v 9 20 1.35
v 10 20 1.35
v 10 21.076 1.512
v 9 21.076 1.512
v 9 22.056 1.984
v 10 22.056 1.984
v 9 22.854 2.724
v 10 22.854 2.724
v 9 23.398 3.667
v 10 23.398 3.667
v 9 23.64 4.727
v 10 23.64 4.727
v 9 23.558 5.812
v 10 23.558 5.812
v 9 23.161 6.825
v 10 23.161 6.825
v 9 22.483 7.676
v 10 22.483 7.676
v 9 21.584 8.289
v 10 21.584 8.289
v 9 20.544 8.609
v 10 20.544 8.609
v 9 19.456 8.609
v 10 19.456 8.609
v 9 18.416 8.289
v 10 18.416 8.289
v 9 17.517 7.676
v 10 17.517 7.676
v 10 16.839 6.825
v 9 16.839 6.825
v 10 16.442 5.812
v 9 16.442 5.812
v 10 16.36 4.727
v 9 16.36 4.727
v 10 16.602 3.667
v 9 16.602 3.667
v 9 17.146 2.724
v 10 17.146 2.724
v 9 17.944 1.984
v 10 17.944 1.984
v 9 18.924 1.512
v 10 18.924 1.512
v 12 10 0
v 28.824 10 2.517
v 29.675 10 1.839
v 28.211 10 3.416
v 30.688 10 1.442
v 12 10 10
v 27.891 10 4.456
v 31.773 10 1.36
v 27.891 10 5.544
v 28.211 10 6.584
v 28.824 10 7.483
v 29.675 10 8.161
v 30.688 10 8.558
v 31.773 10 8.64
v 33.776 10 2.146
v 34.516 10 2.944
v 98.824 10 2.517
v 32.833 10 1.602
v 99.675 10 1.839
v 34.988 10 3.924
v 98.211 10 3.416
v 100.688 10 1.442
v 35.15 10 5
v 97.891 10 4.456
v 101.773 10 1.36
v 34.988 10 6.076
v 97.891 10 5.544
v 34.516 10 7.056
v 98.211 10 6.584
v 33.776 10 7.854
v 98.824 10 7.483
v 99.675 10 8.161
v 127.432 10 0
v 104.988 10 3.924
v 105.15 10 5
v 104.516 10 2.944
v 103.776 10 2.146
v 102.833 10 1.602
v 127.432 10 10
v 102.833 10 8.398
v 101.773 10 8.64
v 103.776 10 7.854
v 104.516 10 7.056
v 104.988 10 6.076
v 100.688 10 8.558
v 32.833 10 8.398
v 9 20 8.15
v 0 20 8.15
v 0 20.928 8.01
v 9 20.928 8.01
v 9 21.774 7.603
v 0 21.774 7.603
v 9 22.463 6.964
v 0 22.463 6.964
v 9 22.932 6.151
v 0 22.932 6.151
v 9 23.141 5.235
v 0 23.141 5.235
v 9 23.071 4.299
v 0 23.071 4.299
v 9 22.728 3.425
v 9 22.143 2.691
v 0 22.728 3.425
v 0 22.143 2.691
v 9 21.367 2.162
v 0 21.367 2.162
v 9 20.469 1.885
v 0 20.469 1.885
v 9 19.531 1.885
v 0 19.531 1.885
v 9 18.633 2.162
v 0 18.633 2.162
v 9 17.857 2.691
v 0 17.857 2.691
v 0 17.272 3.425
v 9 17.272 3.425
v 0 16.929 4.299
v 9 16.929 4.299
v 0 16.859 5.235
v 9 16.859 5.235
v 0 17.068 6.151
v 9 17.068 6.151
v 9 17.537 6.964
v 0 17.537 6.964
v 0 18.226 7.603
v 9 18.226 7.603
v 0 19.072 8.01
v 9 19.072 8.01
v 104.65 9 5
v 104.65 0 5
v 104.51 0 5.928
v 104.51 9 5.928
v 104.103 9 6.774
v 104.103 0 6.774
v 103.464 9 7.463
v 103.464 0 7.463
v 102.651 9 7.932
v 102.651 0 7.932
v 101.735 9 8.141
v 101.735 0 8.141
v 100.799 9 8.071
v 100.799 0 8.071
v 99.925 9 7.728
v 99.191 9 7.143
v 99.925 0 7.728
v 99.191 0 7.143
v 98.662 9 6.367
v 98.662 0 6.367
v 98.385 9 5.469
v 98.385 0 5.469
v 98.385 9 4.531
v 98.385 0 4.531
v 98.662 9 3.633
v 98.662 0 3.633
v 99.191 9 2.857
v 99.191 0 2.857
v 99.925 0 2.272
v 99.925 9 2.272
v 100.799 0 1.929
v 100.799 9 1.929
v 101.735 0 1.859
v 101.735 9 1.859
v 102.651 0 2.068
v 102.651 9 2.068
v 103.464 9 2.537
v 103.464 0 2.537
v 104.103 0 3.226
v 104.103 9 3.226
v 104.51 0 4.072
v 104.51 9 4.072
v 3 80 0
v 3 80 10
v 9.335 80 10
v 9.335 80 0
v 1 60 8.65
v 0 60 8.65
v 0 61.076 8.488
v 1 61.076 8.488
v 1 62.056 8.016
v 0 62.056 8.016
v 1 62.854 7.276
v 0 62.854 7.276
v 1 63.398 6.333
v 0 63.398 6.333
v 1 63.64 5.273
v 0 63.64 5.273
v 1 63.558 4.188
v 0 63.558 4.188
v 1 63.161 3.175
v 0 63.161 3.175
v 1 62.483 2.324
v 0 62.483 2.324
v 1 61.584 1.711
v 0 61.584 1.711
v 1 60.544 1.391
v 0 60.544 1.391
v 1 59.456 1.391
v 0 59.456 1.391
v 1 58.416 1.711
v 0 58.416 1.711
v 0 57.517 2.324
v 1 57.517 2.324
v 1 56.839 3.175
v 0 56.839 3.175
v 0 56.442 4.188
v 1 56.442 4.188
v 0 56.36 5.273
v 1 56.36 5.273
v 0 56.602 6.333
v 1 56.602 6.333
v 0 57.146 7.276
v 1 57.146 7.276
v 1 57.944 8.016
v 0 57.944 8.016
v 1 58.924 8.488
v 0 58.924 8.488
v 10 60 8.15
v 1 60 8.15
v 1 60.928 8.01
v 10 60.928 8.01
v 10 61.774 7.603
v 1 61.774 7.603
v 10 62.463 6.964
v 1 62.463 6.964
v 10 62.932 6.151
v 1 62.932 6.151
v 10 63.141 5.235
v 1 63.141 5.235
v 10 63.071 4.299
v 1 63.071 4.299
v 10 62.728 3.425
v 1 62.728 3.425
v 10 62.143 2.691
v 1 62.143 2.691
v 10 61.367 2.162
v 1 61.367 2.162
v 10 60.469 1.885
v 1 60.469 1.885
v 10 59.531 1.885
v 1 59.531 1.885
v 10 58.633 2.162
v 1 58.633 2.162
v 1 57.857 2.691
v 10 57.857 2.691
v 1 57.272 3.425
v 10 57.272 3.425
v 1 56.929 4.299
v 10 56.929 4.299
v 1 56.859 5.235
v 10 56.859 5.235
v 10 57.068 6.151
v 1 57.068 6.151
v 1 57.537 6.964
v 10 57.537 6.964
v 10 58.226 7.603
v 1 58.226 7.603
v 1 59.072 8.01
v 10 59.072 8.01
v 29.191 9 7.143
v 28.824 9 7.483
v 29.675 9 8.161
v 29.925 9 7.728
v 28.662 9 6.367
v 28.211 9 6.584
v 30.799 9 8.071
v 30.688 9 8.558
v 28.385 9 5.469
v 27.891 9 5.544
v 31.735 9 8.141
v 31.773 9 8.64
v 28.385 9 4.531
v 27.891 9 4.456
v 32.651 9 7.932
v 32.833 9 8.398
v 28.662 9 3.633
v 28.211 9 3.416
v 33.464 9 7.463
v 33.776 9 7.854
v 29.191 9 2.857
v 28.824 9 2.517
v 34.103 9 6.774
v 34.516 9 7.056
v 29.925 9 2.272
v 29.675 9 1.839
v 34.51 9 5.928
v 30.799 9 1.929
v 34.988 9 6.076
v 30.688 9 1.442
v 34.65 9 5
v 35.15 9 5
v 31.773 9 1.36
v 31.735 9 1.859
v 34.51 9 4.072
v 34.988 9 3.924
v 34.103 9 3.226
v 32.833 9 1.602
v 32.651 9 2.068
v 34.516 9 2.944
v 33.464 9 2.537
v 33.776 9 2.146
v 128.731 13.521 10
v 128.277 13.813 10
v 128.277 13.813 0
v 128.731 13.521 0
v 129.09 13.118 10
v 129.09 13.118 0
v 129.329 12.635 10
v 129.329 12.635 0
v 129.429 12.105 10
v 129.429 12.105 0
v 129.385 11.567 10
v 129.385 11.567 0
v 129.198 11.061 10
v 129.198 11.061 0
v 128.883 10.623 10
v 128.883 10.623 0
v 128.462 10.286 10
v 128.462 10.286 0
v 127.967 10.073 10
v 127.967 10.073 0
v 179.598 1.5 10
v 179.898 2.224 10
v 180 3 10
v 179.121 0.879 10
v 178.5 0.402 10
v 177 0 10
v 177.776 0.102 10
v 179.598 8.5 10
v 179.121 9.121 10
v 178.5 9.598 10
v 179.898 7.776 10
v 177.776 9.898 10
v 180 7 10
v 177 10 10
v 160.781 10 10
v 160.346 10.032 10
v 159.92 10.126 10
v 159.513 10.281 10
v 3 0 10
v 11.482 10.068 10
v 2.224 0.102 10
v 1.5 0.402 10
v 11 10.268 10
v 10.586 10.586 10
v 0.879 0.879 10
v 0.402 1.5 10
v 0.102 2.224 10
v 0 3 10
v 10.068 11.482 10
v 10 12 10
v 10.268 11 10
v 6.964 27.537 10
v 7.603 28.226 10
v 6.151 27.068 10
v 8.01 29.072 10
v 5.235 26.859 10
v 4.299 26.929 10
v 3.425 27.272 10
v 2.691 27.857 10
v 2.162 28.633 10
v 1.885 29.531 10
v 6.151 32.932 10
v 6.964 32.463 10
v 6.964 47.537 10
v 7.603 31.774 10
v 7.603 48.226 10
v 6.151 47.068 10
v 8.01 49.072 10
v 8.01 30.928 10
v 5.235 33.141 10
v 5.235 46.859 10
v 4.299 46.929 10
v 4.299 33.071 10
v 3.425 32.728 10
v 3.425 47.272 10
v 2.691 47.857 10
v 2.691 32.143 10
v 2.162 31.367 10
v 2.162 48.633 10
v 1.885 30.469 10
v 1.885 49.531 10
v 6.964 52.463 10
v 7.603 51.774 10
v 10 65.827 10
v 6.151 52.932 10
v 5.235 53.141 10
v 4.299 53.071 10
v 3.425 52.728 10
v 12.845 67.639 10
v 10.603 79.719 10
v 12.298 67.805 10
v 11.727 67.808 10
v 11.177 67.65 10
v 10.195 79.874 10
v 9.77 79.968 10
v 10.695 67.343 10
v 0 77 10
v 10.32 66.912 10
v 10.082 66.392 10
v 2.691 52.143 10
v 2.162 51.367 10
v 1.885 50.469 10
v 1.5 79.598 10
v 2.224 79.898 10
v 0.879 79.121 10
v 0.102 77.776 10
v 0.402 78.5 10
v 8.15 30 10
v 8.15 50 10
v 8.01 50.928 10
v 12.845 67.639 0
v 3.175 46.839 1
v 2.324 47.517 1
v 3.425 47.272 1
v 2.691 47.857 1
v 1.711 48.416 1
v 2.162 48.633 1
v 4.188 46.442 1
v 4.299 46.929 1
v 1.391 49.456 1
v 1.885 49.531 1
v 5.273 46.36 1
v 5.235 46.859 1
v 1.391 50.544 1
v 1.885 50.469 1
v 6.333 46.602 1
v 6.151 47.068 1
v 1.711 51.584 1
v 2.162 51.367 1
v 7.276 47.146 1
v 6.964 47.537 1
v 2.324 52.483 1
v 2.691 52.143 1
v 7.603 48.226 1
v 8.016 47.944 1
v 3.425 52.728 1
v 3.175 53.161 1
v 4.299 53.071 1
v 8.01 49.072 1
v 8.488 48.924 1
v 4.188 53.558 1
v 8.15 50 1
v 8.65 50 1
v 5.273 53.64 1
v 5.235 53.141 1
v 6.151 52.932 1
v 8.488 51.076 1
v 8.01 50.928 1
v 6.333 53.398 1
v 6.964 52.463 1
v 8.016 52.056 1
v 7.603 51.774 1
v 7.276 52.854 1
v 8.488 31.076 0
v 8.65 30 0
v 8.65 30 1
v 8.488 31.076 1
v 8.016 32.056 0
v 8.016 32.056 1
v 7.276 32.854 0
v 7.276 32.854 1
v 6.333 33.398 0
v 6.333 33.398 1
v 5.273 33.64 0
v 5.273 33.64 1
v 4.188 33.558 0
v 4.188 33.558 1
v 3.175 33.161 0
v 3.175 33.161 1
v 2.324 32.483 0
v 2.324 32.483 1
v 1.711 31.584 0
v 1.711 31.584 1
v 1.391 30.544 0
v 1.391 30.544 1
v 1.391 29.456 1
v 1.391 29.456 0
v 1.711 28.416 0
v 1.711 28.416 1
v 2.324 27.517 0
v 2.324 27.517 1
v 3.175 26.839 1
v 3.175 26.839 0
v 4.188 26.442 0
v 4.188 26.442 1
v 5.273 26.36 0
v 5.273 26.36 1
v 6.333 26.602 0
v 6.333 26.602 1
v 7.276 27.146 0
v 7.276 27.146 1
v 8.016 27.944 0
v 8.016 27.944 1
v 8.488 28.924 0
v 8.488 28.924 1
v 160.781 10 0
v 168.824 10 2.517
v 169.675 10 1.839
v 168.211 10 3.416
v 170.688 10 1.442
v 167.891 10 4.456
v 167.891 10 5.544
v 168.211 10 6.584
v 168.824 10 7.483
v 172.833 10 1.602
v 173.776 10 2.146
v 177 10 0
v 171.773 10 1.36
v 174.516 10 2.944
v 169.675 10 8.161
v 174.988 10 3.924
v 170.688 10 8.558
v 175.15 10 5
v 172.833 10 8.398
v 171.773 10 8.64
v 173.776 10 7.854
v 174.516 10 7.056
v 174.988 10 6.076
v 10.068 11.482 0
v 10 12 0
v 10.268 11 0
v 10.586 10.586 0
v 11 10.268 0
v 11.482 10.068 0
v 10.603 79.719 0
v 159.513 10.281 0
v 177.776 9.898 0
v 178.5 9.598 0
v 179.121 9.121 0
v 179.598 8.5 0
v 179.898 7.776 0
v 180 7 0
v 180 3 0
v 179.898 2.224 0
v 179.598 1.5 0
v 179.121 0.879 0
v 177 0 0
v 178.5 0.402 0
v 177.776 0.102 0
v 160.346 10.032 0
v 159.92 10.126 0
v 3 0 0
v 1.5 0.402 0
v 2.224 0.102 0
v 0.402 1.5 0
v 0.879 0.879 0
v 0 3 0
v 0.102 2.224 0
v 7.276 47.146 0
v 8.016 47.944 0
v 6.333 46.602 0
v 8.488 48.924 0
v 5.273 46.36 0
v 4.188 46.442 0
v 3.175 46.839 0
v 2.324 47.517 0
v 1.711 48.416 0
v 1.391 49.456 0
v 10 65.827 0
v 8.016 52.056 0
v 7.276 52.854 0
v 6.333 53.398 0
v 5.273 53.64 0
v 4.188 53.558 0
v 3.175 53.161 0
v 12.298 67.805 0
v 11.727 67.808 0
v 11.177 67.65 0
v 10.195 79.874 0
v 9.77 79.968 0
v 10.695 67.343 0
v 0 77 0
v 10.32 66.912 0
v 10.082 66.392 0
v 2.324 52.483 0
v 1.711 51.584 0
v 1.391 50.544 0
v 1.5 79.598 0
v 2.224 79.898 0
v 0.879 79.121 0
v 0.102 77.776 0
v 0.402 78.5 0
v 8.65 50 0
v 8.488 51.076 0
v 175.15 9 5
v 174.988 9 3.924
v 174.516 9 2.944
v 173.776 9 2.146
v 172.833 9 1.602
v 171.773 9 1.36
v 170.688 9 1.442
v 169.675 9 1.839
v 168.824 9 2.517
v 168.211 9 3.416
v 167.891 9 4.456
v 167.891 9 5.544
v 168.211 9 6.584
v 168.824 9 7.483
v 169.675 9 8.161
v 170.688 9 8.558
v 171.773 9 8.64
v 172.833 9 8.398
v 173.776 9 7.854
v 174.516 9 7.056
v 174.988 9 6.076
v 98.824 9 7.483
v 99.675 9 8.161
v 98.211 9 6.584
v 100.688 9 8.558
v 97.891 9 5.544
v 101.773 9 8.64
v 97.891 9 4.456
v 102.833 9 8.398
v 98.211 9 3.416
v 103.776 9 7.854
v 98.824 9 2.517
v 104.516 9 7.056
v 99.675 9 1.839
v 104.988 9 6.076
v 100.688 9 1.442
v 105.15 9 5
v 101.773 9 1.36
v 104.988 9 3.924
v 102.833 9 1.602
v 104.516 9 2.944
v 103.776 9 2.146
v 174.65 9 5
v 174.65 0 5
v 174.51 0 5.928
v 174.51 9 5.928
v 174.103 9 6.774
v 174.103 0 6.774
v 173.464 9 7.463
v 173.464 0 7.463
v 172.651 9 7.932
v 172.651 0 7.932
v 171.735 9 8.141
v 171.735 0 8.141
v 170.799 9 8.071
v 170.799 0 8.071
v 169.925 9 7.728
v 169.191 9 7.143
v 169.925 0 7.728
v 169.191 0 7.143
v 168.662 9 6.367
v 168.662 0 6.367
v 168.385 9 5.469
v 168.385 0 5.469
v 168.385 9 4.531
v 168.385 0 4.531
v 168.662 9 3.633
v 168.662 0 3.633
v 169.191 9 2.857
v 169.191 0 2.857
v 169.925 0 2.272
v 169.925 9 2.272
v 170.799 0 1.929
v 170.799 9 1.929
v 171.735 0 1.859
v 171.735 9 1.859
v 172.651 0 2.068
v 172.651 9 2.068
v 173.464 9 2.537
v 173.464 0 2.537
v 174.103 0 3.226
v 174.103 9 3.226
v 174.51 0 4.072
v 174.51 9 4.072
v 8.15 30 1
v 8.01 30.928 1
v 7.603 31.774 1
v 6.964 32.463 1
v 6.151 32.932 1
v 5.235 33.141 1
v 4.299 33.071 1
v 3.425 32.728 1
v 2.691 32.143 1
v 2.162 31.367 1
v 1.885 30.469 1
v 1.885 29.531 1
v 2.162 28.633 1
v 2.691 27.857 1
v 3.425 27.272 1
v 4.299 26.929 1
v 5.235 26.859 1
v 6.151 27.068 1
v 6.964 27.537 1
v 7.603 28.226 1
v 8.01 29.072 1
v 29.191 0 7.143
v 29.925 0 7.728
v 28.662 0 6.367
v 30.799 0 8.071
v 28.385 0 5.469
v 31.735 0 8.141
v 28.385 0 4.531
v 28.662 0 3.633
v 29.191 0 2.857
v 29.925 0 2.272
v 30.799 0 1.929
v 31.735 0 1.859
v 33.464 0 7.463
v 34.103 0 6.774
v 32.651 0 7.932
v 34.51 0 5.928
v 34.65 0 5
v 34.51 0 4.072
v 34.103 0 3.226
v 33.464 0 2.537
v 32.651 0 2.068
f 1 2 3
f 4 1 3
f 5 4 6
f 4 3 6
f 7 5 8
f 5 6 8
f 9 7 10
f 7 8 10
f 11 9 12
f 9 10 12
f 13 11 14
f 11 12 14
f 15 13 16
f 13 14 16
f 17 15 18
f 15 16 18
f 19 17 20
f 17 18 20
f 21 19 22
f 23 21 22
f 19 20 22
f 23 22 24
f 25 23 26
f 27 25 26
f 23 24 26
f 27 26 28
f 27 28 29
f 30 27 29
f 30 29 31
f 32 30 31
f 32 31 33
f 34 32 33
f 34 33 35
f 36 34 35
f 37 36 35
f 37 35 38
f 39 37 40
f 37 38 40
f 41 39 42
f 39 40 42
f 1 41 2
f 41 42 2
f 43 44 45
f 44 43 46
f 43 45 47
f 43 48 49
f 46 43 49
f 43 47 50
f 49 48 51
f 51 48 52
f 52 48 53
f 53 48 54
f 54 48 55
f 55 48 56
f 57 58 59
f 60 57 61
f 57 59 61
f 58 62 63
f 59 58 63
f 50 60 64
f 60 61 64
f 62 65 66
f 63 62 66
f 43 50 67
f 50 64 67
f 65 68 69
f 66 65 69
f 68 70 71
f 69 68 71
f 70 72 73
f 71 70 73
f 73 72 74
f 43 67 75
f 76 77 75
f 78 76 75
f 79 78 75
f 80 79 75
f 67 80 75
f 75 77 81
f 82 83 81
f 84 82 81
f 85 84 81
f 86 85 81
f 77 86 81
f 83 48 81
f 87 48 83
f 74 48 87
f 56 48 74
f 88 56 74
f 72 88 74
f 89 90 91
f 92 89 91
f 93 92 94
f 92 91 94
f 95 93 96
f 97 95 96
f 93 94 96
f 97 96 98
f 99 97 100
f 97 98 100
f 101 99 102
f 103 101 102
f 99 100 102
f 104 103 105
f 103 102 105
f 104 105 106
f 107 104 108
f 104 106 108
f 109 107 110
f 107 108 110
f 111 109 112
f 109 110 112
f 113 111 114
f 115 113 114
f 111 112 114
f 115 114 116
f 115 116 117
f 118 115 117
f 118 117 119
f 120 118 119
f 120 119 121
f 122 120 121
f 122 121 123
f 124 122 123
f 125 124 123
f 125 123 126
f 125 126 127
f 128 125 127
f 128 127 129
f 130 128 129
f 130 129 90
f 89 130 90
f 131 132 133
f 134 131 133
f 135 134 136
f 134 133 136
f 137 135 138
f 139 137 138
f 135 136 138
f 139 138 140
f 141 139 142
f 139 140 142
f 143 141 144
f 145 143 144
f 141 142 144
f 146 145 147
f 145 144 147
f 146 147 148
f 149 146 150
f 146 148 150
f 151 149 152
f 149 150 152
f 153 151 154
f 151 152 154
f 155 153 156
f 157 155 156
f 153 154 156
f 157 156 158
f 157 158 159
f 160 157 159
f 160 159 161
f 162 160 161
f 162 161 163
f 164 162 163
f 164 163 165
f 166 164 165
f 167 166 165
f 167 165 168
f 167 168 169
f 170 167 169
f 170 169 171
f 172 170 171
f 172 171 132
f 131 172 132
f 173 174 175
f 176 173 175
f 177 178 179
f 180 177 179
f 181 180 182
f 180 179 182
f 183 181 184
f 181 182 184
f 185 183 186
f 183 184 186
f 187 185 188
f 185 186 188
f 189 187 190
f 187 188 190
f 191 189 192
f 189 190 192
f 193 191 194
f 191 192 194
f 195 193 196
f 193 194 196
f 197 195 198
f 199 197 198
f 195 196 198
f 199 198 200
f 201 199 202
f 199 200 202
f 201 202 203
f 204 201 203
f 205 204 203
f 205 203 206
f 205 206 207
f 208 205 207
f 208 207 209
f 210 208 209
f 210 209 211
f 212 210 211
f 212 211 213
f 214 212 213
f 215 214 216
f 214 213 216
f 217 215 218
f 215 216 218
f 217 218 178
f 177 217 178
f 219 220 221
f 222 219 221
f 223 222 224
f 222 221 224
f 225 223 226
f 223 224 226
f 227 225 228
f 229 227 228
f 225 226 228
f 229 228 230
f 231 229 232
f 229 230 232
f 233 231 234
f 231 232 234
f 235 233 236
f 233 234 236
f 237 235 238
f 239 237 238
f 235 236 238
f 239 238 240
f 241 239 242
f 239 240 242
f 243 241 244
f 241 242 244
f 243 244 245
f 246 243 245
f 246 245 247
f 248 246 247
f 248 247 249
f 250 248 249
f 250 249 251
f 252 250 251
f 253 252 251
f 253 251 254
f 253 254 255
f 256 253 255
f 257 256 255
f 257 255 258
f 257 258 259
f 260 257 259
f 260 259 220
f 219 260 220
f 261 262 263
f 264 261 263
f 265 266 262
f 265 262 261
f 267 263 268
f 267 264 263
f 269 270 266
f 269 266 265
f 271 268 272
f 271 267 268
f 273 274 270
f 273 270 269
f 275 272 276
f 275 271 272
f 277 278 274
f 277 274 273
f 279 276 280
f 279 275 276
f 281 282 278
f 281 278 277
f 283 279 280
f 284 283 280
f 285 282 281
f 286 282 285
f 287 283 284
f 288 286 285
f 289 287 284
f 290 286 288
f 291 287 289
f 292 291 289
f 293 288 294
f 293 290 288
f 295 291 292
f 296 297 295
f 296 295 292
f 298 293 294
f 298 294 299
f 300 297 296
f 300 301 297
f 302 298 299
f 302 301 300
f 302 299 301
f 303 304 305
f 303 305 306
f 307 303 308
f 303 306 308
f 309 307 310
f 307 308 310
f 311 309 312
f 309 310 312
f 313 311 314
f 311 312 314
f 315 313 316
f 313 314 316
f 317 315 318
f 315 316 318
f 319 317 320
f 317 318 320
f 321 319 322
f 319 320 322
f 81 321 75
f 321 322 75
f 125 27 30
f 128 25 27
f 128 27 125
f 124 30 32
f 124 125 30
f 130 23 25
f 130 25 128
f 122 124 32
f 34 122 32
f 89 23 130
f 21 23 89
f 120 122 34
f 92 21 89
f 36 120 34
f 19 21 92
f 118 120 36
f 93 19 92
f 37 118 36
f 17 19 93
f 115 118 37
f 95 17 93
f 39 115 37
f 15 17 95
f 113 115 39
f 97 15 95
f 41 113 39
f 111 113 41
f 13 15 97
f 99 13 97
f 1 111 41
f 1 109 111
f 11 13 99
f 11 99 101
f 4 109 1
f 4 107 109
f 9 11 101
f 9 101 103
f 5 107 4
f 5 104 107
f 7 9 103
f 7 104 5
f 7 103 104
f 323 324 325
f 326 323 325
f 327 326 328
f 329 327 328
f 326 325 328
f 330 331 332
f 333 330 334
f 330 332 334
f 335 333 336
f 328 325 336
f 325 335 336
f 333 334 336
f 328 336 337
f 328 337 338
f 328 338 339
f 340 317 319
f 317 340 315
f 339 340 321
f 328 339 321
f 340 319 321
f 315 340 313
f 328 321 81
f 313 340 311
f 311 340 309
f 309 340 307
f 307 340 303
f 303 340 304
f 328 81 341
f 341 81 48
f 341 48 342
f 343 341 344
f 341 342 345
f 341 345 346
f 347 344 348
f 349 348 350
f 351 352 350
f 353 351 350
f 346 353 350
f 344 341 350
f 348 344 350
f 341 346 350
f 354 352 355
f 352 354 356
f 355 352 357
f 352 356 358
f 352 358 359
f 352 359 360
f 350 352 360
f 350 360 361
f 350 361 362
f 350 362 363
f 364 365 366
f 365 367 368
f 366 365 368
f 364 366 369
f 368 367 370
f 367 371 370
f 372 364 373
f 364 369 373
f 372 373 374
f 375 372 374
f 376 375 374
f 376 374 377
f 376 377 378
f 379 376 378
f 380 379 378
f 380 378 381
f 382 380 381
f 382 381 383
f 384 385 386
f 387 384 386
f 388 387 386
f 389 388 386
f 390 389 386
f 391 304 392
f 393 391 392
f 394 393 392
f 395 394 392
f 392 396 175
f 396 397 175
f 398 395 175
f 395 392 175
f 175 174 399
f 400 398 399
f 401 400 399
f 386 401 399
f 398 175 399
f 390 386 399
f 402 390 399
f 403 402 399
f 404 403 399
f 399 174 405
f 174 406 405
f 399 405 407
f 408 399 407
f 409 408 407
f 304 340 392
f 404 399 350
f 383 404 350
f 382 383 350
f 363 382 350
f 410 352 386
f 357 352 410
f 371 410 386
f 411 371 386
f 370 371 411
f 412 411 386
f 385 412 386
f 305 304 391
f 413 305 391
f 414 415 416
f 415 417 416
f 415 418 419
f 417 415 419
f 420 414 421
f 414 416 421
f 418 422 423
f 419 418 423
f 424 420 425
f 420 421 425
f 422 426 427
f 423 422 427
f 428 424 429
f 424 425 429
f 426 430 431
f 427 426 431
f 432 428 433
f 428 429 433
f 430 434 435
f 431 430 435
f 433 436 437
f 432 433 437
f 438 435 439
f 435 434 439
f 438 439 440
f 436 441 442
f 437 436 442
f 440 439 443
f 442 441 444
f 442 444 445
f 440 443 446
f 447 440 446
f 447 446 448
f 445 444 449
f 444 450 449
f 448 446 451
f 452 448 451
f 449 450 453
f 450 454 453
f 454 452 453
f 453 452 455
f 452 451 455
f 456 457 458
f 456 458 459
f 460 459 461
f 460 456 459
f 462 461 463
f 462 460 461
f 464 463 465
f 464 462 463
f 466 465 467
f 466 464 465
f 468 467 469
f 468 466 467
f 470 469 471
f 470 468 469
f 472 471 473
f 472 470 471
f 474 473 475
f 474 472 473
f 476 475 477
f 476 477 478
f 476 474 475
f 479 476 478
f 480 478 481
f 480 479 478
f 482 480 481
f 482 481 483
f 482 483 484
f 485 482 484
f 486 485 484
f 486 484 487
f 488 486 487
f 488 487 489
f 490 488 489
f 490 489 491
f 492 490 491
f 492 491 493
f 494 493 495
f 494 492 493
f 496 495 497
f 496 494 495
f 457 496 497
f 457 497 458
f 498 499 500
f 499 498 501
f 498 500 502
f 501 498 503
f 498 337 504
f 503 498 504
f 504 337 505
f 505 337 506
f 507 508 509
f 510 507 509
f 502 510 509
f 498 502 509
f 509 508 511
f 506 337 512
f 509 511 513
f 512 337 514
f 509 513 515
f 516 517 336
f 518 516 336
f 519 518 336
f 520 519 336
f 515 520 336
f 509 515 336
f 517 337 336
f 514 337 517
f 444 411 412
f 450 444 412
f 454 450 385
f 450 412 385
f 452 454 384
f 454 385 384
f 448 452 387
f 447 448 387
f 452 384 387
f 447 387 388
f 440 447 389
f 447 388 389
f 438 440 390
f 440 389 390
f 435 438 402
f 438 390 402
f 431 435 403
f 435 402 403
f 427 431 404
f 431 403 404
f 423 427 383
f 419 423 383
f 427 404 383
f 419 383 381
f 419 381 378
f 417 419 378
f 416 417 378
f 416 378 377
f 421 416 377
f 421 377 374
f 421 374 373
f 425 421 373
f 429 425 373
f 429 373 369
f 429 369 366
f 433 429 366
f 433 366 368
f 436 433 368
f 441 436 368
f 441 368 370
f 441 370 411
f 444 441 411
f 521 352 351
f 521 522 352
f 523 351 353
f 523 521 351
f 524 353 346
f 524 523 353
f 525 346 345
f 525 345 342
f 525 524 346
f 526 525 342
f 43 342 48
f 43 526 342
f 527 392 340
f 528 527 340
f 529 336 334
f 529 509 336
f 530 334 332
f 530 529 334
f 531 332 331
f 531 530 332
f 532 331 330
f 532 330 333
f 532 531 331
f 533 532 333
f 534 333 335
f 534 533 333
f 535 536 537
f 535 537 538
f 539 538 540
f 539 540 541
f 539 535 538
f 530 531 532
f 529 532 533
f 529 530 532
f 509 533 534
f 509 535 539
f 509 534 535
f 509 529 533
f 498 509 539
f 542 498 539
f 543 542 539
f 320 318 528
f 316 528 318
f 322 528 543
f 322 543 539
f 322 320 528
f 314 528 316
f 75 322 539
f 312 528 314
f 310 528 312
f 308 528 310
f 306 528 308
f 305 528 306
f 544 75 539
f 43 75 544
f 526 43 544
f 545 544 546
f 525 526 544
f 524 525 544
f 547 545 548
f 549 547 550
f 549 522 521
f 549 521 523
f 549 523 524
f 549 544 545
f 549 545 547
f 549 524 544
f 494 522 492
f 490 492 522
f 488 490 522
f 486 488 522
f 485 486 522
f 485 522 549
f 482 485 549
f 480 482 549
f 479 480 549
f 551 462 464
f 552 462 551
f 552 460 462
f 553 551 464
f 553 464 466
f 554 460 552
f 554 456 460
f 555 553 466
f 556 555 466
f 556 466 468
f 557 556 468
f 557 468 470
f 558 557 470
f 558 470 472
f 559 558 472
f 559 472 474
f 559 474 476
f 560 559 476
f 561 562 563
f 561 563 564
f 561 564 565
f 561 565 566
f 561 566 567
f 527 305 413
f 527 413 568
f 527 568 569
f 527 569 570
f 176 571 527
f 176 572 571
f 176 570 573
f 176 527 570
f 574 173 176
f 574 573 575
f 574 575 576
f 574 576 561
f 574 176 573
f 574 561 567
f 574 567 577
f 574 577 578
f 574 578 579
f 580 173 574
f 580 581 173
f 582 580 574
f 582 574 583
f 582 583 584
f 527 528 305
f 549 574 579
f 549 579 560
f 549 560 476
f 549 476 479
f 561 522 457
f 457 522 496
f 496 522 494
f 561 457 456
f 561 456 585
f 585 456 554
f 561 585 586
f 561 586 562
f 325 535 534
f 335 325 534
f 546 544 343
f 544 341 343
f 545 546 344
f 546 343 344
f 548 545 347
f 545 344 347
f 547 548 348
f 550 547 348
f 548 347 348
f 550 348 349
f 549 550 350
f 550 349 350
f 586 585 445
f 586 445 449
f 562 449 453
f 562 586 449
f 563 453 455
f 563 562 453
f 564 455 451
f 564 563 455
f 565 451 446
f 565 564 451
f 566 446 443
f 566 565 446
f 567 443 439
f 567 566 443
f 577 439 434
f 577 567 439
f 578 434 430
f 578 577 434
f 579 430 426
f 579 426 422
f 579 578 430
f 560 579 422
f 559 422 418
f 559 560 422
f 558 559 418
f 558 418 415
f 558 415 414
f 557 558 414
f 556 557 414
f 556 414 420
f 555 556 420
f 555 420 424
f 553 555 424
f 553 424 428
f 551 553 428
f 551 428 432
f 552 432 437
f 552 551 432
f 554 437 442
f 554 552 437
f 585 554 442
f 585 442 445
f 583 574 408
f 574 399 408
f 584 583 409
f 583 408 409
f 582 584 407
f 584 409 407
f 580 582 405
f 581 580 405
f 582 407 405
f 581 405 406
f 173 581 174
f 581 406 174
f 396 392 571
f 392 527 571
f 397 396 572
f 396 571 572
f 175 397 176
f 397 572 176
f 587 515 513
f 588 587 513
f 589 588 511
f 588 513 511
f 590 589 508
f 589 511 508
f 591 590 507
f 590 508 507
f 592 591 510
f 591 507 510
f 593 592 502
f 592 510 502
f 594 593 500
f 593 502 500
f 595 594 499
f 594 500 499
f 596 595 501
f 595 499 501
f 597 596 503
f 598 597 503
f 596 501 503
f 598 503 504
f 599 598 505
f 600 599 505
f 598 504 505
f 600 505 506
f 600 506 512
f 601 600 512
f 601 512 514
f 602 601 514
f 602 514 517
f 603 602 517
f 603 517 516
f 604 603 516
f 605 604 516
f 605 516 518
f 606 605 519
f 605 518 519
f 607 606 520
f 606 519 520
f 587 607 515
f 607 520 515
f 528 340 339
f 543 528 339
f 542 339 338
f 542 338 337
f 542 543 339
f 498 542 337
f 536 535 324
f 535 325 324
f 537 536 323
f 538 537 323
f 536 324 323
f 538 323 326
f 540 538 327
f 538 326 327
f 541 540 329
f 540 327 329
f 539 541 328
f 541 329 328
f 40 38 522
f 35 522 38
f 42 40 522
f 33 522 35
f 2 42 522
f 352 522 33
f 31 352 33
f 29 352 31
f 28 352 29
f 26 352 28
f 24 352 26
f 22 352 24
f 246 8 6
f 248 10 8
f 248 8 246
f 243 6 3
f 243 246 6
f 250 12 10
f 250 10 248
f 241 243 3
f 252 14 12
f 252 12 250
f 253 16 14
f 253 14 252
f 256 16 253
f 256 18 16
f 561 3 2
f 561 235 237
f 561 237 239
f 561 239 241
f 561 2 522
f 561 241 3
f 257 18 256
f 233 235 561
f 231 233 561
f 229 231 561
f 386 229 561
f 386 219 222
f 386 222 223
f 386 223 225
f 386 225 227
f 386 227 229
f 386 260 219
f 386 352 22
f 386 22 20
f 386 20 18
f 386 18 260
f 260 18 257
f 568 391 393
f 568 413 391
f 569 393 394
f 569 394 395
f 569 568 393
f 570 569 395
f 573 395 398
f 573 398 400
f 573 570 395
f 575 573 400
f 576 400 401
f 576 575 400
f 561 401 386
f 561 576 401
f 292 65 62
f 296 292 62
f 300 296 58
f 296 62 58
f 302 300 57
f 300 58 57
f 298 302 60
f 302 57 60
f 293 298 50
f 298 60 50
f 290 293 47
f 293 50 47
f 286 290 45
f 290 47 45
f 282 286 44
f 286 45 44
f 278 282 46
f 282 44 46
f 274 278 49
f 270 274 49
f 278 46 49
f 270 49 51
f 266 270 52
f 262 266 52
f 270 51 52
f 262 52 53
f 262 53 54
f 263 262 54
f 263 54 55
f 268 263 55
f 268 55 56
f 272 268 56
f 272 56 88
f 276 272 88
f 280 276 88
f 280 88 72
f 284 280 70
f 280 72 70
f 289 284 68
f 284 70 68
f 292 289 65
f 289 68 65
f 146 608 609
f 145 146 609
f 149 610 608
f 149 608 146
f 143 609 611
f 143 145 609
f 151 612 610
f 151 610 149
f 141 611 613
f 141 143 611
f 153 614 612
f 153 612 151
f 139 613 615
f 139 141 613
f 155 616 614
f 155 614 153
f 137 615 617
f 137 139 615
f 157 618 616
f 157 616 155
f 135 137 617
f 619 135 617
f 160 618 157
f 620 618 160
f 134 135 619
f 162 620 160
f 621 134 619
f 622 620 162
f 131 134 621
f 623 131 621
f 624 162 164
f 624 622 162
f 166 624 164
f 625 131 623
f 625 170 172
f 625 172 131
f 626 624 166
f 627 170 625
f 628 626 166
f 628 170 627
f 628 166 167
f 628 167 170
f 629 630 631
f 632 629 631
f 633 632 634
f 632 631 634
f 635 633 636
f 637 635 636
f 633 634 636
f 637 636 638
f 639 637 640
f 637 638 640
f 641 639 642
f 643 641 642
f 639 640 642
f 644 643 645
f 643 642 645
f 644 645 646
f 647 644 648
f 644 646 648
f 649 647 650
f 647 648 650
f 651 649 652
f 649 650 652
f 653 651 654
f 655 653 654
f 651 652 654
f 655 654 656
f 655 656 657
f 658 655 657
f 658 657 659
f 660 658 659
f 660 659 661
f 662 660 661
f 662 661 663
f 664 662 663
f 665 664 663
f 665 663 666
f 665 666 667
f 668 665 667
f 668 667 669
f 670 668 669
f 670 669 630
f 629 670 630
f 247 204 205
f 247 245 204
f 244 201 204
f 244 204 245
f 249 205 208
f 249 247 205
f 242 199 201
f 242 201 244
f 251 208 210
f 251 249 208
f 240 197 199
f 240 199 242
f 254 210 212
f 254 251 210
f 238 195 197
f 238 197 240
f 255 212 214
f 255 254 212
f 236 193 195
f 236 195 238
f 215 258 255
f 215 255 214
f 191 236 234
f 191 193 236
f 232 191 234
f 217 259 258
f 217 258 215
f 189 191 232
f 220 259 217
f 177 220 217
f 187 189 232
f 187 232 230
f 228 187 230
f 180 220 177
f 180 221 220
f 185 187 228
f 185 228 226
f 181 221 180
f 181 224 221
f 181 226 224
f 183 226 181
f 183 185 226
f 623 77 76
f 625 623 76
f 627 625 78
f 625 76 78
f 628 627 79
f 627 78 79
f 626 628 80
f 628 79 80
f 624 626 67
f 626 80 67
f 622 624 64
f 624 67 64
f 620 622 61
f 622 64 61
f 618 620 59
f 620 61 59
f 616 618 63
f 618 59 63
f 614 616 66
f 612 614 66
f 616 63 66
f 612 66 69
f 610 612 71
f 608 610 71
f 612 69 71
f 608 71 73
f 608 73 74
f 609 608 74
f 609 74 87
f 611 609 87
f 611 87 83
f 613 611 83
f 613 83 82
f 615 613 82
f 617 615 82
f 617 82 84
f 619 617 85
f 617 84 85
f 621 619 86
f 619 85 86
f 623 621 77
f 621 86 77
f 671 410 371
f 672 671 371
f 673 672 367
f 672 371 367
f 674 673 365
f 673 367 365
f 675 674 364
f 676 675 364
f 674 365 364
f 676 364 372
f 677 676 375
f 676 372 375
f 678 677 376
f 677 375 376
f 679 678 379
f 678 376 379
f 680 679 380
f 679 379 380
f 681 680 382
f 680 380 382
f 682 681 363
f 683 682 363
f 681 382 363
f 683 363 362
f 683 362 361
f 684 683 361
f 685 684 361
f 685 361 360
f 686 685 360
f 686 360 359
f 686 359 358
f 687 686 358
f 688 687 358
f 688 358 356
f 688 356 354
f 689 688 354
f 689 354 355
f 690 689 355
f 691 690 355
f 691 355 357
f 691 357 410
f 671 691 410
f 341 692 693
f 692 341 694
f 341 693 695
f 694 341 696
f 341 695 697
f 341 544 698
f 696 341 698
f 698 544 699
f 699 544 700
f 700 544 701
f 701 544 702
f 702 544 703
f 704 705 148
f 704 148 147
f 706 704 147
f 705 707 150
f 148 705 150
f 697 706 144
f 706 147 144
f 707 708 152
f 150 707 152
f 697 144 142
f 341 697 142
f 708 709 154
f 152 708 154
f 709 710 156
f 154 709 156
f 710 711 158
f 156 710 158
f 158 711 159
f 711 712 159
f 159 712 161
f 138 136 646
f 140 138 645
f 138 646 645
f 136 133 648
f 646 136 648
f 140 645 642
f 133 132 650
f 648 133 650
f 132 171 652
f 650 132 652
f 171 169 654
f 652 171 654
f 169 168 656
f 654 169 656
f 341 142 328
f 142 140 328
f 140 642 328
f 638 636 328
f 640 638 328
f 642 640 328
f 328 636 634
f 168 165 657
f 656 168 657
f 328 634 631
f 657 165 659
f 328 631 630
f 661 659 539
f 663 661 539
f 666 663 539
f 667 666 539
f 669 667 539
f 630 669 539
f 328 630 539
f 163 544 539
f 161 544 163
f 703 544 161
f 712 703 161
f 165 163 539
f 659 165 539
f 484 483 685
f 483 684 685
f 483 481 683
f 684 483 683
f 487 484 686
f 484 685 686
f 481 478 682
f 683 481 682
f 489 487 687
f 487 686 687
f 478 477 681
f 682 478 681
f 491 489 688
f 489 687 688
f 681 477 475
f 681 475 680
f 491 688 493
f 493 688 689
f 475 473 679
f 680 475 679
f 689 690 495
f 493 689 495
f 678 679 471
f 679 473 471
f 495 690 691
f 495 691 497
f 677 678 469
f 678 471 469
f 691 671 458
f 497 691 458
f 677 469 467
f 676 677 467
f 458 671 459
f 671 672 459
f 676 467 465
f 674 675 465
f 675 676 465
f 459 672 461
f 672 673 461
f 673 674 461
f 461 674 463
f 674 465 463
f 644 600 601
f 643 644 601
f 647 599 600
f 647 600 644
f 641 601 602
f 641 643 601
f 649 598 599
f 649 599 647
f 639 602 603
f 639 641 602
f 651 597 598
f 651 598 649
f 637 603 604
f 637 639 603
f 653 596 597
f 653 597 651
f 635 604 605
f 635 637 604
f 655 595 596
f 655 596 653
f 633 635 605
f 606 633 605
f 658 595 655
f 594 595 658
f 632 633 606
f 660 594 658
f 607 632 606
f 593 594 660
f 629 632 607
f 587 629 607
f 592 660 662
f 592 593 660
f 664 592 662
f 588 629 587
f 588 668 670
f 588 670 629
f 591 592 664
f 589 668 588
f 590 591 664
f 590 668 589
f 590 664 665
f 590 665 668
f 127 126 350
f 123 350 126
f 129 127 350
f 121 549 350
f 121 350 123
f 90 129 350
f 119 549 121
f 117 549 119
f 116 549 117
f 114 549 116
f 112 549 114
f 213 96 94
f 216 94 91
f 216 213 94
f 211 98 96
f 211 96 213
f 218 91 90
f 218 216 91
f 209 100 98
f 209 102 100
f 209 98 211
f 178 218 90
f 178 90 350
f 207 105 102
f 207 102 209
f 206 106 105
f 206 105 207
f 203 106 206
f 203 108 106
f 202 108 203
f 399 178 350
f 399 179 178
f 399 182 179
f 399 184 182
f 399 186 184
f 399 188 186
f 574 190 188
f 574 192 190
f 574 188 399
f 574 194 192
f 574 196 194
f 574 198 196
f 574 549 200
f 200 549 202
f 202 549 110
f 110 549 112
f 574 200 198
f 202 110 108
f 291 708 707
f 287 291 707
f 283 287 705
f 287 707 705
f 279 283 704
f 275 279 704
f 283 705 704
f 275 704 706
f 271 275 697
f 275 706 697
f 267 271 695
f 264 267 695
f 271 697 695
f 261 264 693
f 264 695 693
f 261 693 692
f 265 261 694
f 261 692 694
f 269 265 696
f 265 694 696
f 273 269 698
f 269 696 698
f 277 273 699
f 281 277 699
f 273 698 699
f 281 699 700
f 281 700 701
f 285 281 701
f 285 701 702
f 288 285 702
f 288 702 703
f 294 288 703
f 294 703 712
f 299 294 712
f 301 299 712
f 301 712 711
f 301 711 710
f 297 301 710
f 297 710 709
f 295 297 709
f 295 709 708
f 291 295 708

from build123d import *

# Parameters (mm, degrees)
ESQUISSE1_W                         = 180
ESQUISSE1_H                         = 80
BOSS_EXTRU_1_DEPTH                  = 10
ESQUISSE2_W                         = 170
ESQUISSE2_H                         = 70
ENL_V_MAT_EXTRU_1_DEPTH             = 1
ENL_V_MAT_EXTRU_1_DEPTH_BACK        = 11
BOSS_EXTRU_2_DEPTH                  = 10
ENL_V_MAT_EXTRU_2_REACH             = 82
ESQUISSE4_R                         = 3.15
ENL_V_MAT_EXTRU_2_DIRECTION_2_DEPTH = 1
ESQUISSE5_R                         = 3.65
ENL_V_MAT_EXTRU_3_DEPTH             = 1
ENL_V_MAT_EXTRU_4_REACH             = 182
ESQUISSE6_R                         = 3.15
ENL_V_MAT_EXTRU_4_DIRECTION_2_DEPTH = 1
ESQUISSE7_R                         = 3.65
ENL_V_MAT_EXTRU_5_DEPTH             = 1
ESQUISSE8_R                         = 3.65
ENL_V_MAT_EXTRU_6_DEPTH             = 1
CONG_1_R                            = 2
CONG_2_R                            = 3
ESQUISSE9_R                         = 3.15
ENL_V_MAT_EXTRU_7_DEPTH             = 1
ENL_V_MAT_EXTRU_7_DEPTH_BACK        = 11
ENL_V_START                         = -10
ESQUISSE10_R                        = 3.65
ENL_V_MAT_EXTRU_8_DEPTH             = 1


with BuildPart() as part:
    # Esquisse1 → Boss.-Extru.1 (new body)
    with BuildSketch(Plane.XY):
        with Locations((90, 40)):
            Rectangle(ESQUISSE1_W, ESQUISSE1_H)
    extrude(amount=BOSS_EXTRU_1_DEPTH)

    # Esquisse2 → Enlèv. mat.-Extru.1 (cut, two sides)
    with BuildSketch(Plane.XY.offset(10)) as enl_v_mat_extru_1_sk:
        with Locations((95, 45)):
            Rectangle(ESQUISSE2_W, ESQUISSE2_H)
    extrude(amount=ENL_V_MAT_EXTRU_1_DEPTH, mode=Mode.SUBTRACT)
    extrude(enl_v_mat_extru_1_sk.sketch, amount=-ENL_V_MAT_EXTRU_1_DEPTH_BACK, mode=Mode.SUBTRACT)

    # Esquisse3 → Boss.-Extru.2 (add)
    with BuildSketch(Plane.XY.offset(10)):
        Polygon((10, 80), (160.115484436, 10), (136.453468604, 10), (10, 68.96622081), align=None)
    extrude(amount=-BOSS_EXTRU_2_DEPTH)

    # Esquisse4 → Enlèv. mat.-Extru.2 (cut, up to next)
    with BuildSketch(Plane.XZ, mode=Mode.PRIVATE) as enl_v_mat_extru_2_sk1:
        with Locations((101.5, 5)):
            Circle(ESQUISSE4_R)
    enl_v_mat_extru_2_tool1 = extrude(enl_v_mat_extru_2_sk1.sketch, amount=-ENL_V_MAT_EXTRU_2_REACH, mode=Mode.PRIVATE) & part.part
    add(enl_v_mat_extru_2_tool1.solids().sort_by_distance((101.5, 0, 5))[0], mode=Mode.SUBTRACT)
    # Esquisse4 → Enlèv. mat.-Extru.2 (cut, up to next)
    with BuildSketch(Plane.XZ, mode=Mode.PRIVATE) as enl_v_mat_extru_2_sk2:
        with Locations((171.5, 5)):
            Circle(ESQUISSE4_R)
    enl_v_mat_extru_2_tool2 = extrude(enl_v_mat_extru_2_sk2.sketch, amount=-ENL_V_MAT_EXTRU_2_REACH, mode=Mode.PRIVATE) & part.part
    add(enl_v_mat_extru_2_tool2.solids().sort_by_distance((171.5, 0, 5))[0], mode=Mode.SUBTRACT)
    # Esquisse4 → Enlèv. mat.-Extru.2 (cut, up to next)
    with BuildSketch(Plane.XZ, mode=Mode.PRIVATE) as enl_v_mat_extru_2_sk3:
        with Locations((31.5, 5)):
            Circle(ESQUISSE4_R)
    enl_v_mat_extru_2_tool3 = extrude(enl_v_mat_extru_2_sk3.sketch, amount=-ENL_V_MAT_EXTRU_2_REACH, mode=Mode.PRIVATE) & part.part
    add(enl_v_mat_extru_2_tool3.solids().sort_by_distance((31.5, 0, 5))[0], mode=Mode.SUBTRACT)

    # Esquisse4 → Enlèv. mat.-Extru.2 direction 2 (cut)
    with BuildSketch(Plane.XZ):
        with Locations((101.5, 5)):
            Circle(ESQUISSE4_R)
        with Locations((171.5, 5)):
            Circle(ESQUISSE4_R)
        with Locations((31.5, 5)):
            Circle(ESQUISSE4_R)
    extrude(amount=ENL_V_MAT_EXTRU_2_DIRECTION_2_DEPTH, mode=Mode.SUBTRACT)

    # Esquisse5 → Enlèv. mat.-Extru.3 (cut)
    with BuildSketch(Plane(origin=(0, 10, 0), x_dir=(1, 0, 0), z_dir=(0, 1, 0))):
        with Locations((101.5, -5)):
            Circle(ESQUISSE5_R)
        with Locations((171.5, -5)):
            Circle(ESQUISSE5_R)
        with Locations((31.5, -5)):
            Circle(ESQUISSE5_R)
    extrude(amount=-ENL_V_MAT_EXTRU_3_DEPTH, mode=Mode.SUBTRACT)

    # Esquisse6 → Enlèv. mat.-Extru.4 (cut, up to next)
    with BuildSketch(Plane.ZY, mode=Mode.PRIVATE) as enl_v_mat_extru_4_sk1:
        with Locations((5, 60)):
            Circle(ESQUISSE6_R)
    enl_v_mat_extru_4_tool1 = extrude(enl_v_mat_extru_4_sk1.sketch, amount=-ENL_V_MAT_EXTRU_4_REACH, mode=Mode.PRIVATE) & part.part
    add(enl_v_mat_extru_4_tool1.solids().sort_by_distance((0, 60, 5))[0], mode=Mode.SUBTRACT)
    # Esquisse6 → Enlèv. mat.-Extru.4 (cut, up to next)
    with BuildSketch(Plane.ZY, mode=Mode.PRIVATE) as enl_v_mat_extru_4_sk2:
        with Locations((5, 20)):
            Circle(ESQUISSE6_R)
    enl_v_mat_extru_4_tool2 = extrude(enl_v_mat_extru_4_sk2.sketch, amount=-ENL_V_MAT_EXTRU_4_REACH, mode=Mode.PRIVATE) & part.part
    add(enl_v_mat_extru_4_tool2.solids().sort_by_distance((0, 20, 5))[0], mode=Mode.SUBTRACT)

    # Esquisse6 → Enlèv. mat.-Extru.4 direction 2 (cut)
    with BuildSketch(Plane.ZY):
        with Locations((5, 60)):
            Circle(ESQUISSE6_R)
        with Locations((5, 20)):
            Circle(ESQUISSE6_R)
    extrude(amount=ENL_V_MAT_EXTRU_4_DIRECTION_2_DEPTH, mode=Mode.SUBTRACT)

    # Esquisse7 → Enlèv. mat.-Extru.5 (cut)
    with BuildSketch(Plane.ZY):
        with Locations((5, 60)):
            Circle(ESQUISSE7_R)
    extrude(amount=-ENL_V_MAT_EXTRU_5_DEPTH, mode=Mode.SUBTRACT)

    # Esquisse8 → Enlèv. mat.-Extru.6 (cut)
    with BuildSketch(Plane(origin=(10, 0, 0), x_dir=(0, 0, -1), z_dir=(1, 0, 0))):
        with Locations((-5, 20)):
            Circle(ESQUISSE8_R)
    extrude(amount=-ENL_V_MAT_EXTRU_6_DEPTH, mode=Mode.SUBTRACT)

    # Congé1
    cong_1_edges = [part.edges().sort_by_distance(p)[0] for p in [
        (10, 10, 5),
        (10, 68.96622081, 5),
        (136.453468604, 10, 5),
    ]]
    fillet(cong_1_edges, radius=CONG_1_R)

    # Congé2
    cong_2_edges = [part.edges().sort_by_distance(p)[0] for p in [
        (10, 80, 5),
        (180, 10, 5),
        (160.115484436, 10, 5),
        (0, 80, 5),
        (180, 0, 5),
        (0, 0, 5),
    ]]
    fillet(cong_2_edges, radius=CONG_2_R)

    # Esquisse9 → Enlèv. mat.-Extru.7 (cut, two sides)
    with BuildSketch(Plane.XY.offset(10)) as enl_v_mat_extru_7_sk:
        with Locations((5, 50)):
            Circle(ESQUISSE9_R)
        with Locations((5, 30)):
            Circle(ESQUISSE9_R)
    extrude(amount=ENL_V_MAT_EXTRU_7_DEPTH, mode=Mode.SUBTRACT)
    extrude(enl_v_mat_extru_7_sk.sketch, amount=-ENL_V_MAT_EXTRU_7_DEPTH_BACK, mode=Mode.SUBTRACT)

    # Esquisse10 → Enlèv. mat.-Extru.8 (cut)
    with BuildSketch(Plane.XY.offset(10).offset(ENL_V_START)):
        with Locations((5, 50)):
            Circle(ESQUISSE10_R)
        with Locations((5, 30)):
            Circle(ESQUISSE10_R)
    extrude(amount=ENL_V_MAT_EXTRU_8_DEPTH, mode=Mode.SUBTRACT)


solid = part.part
